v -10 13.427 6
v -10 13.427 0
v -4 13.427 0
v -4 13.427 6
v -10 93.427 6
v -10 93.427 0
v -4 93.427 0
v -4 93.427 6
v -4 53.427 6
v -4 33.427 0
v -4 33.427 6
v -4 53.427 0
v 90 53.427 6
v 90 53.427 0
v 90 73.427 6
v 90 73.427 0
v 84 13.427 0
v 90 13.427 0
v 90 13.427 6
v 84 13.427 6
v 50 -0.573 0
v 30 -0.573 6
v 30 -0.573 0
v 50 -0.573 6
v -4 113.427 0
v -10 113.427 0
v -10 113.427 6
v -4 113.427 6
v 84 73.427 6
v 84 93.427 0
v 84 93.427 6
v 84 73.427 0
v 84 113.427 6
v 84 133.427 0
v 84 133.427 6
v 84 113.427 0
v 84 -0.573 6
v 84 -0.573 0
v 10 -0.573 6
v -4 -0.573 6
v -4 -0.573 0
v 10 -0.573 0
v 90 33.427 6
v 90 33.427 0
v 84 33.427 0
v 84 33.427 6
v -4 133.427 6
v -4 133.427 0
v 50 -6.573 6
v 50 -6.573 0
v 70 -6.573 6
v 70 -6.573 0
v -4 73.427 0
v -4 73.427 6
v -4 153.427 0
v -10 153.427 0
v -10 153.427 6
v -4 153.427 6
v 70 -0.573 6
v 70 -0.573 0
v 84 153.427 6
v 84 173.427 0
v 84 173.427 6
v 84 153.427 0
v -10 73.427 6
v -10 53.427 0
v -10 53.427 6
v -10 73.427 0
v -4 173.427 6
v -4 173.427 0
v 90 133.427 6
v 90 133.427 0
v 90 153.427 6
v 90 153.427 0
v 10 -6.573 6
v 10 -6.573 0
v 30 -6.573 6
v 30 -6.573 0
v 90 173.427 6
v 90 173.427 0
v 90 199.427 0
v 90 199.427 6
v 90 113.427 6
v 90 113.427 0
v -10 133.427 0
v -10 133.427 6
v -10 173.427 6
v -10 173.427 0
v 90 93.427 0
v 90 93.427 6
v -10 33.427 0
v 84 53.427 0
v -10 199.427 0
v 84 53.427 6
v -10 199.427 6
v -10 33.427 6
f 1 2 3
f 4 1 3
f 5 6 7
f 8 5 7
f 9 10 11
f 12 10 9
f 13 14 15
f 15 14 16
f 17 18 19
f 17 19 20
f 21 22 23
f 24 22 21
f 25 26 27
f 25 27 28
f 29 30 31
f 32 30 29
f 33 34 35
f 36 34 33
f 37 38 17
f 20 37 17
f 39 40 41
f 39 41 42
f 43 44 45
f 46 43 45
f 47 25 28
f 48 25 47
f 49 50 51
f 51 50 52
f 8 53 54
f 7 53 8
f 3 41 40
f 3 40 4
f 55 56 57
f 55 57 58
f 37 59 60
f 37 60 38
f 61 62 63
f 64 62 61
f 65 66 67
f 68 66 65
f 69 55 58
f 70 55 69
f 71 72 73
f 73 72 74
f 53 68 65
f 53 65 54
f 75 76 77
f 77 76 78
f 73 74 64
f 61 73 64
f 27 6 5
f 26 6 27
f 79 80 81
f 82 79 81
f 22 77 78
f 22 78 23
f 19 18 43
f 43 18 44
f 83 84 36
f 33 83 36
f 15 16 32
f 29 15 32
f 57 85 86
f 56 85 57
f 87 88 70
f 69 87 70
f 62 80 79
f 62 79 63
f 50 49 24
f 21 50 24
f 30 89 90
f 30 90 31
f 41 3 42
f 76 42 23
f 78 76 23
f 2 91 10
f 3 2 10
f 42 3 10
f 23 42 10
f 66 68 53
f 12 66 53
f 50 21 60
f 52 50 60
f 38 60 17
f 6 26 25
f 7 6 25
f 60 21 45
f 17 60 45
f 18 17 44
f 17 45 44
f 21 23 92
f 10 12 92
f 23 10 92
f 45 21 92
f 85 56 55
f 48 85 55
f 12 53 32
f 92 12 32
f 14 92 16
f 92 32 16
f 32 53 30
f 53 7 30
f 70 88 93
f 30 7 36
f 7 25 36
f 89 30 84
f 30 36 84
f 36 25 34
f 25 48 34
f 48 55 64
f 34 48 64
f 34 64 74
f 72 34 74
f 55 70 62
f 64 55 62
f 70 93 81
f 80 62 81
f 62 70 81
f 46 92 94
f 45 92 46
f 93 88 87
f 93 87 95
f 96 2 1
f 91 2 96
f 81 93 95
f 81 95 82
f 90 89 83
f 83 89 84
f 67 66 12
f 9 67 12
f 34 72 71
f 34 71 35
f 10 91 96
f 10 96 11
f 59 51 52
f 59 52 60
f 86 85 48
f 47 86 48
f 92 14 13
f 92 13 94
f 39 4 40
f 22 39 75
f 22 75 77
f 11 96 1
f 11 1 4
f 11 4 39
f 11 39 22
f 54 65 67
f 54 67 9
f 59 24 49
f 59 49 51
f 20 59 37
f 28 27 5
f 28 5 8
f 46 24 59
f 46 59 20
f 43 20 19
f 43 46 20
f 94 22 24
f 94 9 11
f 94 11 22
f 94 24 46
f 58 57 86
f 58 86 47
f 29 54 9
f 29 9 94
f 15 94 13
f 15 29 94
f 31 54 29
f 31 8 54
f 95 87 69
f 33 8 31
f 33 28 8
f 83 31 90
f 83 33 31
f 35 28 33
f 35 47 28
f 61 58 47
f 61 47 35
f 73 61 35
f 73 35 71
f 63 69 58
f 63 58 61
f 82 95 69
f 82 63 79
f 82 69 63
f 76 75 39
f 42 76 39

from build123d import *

# Parameters (mm, degrees)
SKETCH1_W               = 100
SKETCH1_H               = 206
BOSS_EXTRUDE1_DEPTH     = 6
SKETCH2_W               = 6
SKETCH2_H               = 20
CUT_EXTRUDE1_DEPTH      = 10
LPATTERN1_COUNT         = 5
LPATTERN1_PITCH         = 40
MIRROR2_COPY_1_SKETCH_W = 6
MIRROR2_COPY_1_SKETCH_H = 20
MIRROR2_COPY_1_DEPTH    = 10
MIRROR2_COPY_2_SKETCH_W = 6
MIRROR2_COPY_2_SKETCH_H = 20
MIRROR2_COPY_2_DEPTH    = 10
MIRROR2_COPY_3_SKETCH_W = 6
MIRROR2_COPY_3_SKETCH_H = 20
MIRROR2_COPY_3_DEPTH    = 10
MIRROR2_COPY_4_SKETCH_W = 6
MIRROR2_COPY_4_SKETCH_H = 20
MIRROR2_COPY_4_DEPTH    = 10
SKETCH4_W               = 20
SKETCH4_H               = 6
CUT_EXTRUDE2_DEPTH      = 10
LPATTERN2_COUNT         = 3
LPATTERN2_PITCH         = 40


with BuildPart() as part:
    # Sketch1 → Boss-Extrude1 (new body)
    with BuildSketch(Plane.XY):
        with Locations((40, 96.427419355)):
            Rectangle(SKETCH1_W, SKETCH1_H)
    extrude(amount=BOSS_EXTRUDE1_DEPTH)

    # Sketch2 → Cut-Extrude1 (cut)
    with BuildSketch(Plane.XY):
        with Locations((-7, 3.427419355)):
            Rectangle(SKETCH2_W, SKETCH2_H)
    cut_extrude1 = extrude(amount=CUT_EXTRUDE1_DEPTH, mode=Mode.SUBTRACT)

    # LPattern1: Cut-Extrude1 ×5
    with Locations(*[(0, i * LPATTERN1_PITCH, 0) for i in range(1, LPATTERN1_COUNT)]):
        add(cut_extrude1, mode=Mode.SUBTRACT)

    # Mirror2: Cut-Extrude1 across plane
    add(cut_extrude1.mirror(Plane(origin=(40, 0, 0), x_dir=(0, 0, 1), z_dir=(1, 0, 0))), mode=Mode.SUBTRACT)

    # Mirror2 copy 1 sketch → Mirror2 copy 1 (cut)
    with BuildSketch(Plane(origin=(80, 40, 0), x_dir=(-1, 0, 0), z_dir=(0, 0, 1))):
        with Locations((-7, -3.427419355)):
            Rectangle(MIRROR2_COPY_1_SKETCH_W, MIRROR2_COPY_1_SKETCH_H)
    extrude(amount=MIRROR2_COPY_1_DEPTH, mode=Mode.SUBTRACT)

    # Mirror2 copy 2 sketch → Mirror2 copy 2 (cut)
    with BuildSketch(Plane(origin=(80, 80, 0), x_dir=(-1, 0, 0), z_dir=(0, 0, 1))):
        with Locations((-7, -3.427419355)):
            Rectangle(MIRROR2_COPY_2_SKETCH_W, MIRROR2_COPY_2_SKETCH_H)
    extrude(amount=MIRROR2_COPY_2_DEPTH, mode=Mode.SUBTRACT)

    # Mirror2 copy 3 sketch → Mirror2 copy 3 (cut)
    with BuildSketch(Plane(origin=(80, 120, 0), x_dir=(-1, 0, 0), z_dir=(0, 0, 1))):
        with Locations((-7, -3.427419355)):
            Rectangle(MIRROR2_COPY_3_SKETCH_W, MIRROR2_COPY_3_SKETCH_H)
    extrude(amount=MIRROR2_COPY_3_DEPTH, mode=Mode.SUBTRACT)

    # Mirror2 copy 4 sketch → Mirror2 copy 4 (cut)
    with BuildSketch(Plane(origin=(80, 160, 0), x_dir=(-1, 0, 0), z_dir=(0, 0, 1))):
        with Locations((-7, -3.427419355)):
            Rectangle(MIRROR2_COPY_4_SKETCH_W, MIRROR2_COPY_4_SKETCH_H)
    extrude(amount=MIRROR2_COPY_4_DEPTH, mode=Mode.SUBTRACT)

    # Sketch4 → Cut-Extrude2 (cut)
    with BuildSketch(Plane.XY.offset(6)):
        with Locations((0, -3.572580645)):
            Rectangle(SKETCH4_W, SKETCH4_H)
    cut_extrude2 = extrude(amount=-CUT_EXTRUDE2_DEPTH, mode=Mode.SUBTRACT)

    # LPattern2: Cut-Extrude2 ×3
    with Locations(*[(i * LPATTERN2_PITCH, 0, 0) for i in range(1, LPATTERN2_COUNT)]):
        add(cut_extrude2, mode=Mode.SUBTRACT)


solid = part.part
